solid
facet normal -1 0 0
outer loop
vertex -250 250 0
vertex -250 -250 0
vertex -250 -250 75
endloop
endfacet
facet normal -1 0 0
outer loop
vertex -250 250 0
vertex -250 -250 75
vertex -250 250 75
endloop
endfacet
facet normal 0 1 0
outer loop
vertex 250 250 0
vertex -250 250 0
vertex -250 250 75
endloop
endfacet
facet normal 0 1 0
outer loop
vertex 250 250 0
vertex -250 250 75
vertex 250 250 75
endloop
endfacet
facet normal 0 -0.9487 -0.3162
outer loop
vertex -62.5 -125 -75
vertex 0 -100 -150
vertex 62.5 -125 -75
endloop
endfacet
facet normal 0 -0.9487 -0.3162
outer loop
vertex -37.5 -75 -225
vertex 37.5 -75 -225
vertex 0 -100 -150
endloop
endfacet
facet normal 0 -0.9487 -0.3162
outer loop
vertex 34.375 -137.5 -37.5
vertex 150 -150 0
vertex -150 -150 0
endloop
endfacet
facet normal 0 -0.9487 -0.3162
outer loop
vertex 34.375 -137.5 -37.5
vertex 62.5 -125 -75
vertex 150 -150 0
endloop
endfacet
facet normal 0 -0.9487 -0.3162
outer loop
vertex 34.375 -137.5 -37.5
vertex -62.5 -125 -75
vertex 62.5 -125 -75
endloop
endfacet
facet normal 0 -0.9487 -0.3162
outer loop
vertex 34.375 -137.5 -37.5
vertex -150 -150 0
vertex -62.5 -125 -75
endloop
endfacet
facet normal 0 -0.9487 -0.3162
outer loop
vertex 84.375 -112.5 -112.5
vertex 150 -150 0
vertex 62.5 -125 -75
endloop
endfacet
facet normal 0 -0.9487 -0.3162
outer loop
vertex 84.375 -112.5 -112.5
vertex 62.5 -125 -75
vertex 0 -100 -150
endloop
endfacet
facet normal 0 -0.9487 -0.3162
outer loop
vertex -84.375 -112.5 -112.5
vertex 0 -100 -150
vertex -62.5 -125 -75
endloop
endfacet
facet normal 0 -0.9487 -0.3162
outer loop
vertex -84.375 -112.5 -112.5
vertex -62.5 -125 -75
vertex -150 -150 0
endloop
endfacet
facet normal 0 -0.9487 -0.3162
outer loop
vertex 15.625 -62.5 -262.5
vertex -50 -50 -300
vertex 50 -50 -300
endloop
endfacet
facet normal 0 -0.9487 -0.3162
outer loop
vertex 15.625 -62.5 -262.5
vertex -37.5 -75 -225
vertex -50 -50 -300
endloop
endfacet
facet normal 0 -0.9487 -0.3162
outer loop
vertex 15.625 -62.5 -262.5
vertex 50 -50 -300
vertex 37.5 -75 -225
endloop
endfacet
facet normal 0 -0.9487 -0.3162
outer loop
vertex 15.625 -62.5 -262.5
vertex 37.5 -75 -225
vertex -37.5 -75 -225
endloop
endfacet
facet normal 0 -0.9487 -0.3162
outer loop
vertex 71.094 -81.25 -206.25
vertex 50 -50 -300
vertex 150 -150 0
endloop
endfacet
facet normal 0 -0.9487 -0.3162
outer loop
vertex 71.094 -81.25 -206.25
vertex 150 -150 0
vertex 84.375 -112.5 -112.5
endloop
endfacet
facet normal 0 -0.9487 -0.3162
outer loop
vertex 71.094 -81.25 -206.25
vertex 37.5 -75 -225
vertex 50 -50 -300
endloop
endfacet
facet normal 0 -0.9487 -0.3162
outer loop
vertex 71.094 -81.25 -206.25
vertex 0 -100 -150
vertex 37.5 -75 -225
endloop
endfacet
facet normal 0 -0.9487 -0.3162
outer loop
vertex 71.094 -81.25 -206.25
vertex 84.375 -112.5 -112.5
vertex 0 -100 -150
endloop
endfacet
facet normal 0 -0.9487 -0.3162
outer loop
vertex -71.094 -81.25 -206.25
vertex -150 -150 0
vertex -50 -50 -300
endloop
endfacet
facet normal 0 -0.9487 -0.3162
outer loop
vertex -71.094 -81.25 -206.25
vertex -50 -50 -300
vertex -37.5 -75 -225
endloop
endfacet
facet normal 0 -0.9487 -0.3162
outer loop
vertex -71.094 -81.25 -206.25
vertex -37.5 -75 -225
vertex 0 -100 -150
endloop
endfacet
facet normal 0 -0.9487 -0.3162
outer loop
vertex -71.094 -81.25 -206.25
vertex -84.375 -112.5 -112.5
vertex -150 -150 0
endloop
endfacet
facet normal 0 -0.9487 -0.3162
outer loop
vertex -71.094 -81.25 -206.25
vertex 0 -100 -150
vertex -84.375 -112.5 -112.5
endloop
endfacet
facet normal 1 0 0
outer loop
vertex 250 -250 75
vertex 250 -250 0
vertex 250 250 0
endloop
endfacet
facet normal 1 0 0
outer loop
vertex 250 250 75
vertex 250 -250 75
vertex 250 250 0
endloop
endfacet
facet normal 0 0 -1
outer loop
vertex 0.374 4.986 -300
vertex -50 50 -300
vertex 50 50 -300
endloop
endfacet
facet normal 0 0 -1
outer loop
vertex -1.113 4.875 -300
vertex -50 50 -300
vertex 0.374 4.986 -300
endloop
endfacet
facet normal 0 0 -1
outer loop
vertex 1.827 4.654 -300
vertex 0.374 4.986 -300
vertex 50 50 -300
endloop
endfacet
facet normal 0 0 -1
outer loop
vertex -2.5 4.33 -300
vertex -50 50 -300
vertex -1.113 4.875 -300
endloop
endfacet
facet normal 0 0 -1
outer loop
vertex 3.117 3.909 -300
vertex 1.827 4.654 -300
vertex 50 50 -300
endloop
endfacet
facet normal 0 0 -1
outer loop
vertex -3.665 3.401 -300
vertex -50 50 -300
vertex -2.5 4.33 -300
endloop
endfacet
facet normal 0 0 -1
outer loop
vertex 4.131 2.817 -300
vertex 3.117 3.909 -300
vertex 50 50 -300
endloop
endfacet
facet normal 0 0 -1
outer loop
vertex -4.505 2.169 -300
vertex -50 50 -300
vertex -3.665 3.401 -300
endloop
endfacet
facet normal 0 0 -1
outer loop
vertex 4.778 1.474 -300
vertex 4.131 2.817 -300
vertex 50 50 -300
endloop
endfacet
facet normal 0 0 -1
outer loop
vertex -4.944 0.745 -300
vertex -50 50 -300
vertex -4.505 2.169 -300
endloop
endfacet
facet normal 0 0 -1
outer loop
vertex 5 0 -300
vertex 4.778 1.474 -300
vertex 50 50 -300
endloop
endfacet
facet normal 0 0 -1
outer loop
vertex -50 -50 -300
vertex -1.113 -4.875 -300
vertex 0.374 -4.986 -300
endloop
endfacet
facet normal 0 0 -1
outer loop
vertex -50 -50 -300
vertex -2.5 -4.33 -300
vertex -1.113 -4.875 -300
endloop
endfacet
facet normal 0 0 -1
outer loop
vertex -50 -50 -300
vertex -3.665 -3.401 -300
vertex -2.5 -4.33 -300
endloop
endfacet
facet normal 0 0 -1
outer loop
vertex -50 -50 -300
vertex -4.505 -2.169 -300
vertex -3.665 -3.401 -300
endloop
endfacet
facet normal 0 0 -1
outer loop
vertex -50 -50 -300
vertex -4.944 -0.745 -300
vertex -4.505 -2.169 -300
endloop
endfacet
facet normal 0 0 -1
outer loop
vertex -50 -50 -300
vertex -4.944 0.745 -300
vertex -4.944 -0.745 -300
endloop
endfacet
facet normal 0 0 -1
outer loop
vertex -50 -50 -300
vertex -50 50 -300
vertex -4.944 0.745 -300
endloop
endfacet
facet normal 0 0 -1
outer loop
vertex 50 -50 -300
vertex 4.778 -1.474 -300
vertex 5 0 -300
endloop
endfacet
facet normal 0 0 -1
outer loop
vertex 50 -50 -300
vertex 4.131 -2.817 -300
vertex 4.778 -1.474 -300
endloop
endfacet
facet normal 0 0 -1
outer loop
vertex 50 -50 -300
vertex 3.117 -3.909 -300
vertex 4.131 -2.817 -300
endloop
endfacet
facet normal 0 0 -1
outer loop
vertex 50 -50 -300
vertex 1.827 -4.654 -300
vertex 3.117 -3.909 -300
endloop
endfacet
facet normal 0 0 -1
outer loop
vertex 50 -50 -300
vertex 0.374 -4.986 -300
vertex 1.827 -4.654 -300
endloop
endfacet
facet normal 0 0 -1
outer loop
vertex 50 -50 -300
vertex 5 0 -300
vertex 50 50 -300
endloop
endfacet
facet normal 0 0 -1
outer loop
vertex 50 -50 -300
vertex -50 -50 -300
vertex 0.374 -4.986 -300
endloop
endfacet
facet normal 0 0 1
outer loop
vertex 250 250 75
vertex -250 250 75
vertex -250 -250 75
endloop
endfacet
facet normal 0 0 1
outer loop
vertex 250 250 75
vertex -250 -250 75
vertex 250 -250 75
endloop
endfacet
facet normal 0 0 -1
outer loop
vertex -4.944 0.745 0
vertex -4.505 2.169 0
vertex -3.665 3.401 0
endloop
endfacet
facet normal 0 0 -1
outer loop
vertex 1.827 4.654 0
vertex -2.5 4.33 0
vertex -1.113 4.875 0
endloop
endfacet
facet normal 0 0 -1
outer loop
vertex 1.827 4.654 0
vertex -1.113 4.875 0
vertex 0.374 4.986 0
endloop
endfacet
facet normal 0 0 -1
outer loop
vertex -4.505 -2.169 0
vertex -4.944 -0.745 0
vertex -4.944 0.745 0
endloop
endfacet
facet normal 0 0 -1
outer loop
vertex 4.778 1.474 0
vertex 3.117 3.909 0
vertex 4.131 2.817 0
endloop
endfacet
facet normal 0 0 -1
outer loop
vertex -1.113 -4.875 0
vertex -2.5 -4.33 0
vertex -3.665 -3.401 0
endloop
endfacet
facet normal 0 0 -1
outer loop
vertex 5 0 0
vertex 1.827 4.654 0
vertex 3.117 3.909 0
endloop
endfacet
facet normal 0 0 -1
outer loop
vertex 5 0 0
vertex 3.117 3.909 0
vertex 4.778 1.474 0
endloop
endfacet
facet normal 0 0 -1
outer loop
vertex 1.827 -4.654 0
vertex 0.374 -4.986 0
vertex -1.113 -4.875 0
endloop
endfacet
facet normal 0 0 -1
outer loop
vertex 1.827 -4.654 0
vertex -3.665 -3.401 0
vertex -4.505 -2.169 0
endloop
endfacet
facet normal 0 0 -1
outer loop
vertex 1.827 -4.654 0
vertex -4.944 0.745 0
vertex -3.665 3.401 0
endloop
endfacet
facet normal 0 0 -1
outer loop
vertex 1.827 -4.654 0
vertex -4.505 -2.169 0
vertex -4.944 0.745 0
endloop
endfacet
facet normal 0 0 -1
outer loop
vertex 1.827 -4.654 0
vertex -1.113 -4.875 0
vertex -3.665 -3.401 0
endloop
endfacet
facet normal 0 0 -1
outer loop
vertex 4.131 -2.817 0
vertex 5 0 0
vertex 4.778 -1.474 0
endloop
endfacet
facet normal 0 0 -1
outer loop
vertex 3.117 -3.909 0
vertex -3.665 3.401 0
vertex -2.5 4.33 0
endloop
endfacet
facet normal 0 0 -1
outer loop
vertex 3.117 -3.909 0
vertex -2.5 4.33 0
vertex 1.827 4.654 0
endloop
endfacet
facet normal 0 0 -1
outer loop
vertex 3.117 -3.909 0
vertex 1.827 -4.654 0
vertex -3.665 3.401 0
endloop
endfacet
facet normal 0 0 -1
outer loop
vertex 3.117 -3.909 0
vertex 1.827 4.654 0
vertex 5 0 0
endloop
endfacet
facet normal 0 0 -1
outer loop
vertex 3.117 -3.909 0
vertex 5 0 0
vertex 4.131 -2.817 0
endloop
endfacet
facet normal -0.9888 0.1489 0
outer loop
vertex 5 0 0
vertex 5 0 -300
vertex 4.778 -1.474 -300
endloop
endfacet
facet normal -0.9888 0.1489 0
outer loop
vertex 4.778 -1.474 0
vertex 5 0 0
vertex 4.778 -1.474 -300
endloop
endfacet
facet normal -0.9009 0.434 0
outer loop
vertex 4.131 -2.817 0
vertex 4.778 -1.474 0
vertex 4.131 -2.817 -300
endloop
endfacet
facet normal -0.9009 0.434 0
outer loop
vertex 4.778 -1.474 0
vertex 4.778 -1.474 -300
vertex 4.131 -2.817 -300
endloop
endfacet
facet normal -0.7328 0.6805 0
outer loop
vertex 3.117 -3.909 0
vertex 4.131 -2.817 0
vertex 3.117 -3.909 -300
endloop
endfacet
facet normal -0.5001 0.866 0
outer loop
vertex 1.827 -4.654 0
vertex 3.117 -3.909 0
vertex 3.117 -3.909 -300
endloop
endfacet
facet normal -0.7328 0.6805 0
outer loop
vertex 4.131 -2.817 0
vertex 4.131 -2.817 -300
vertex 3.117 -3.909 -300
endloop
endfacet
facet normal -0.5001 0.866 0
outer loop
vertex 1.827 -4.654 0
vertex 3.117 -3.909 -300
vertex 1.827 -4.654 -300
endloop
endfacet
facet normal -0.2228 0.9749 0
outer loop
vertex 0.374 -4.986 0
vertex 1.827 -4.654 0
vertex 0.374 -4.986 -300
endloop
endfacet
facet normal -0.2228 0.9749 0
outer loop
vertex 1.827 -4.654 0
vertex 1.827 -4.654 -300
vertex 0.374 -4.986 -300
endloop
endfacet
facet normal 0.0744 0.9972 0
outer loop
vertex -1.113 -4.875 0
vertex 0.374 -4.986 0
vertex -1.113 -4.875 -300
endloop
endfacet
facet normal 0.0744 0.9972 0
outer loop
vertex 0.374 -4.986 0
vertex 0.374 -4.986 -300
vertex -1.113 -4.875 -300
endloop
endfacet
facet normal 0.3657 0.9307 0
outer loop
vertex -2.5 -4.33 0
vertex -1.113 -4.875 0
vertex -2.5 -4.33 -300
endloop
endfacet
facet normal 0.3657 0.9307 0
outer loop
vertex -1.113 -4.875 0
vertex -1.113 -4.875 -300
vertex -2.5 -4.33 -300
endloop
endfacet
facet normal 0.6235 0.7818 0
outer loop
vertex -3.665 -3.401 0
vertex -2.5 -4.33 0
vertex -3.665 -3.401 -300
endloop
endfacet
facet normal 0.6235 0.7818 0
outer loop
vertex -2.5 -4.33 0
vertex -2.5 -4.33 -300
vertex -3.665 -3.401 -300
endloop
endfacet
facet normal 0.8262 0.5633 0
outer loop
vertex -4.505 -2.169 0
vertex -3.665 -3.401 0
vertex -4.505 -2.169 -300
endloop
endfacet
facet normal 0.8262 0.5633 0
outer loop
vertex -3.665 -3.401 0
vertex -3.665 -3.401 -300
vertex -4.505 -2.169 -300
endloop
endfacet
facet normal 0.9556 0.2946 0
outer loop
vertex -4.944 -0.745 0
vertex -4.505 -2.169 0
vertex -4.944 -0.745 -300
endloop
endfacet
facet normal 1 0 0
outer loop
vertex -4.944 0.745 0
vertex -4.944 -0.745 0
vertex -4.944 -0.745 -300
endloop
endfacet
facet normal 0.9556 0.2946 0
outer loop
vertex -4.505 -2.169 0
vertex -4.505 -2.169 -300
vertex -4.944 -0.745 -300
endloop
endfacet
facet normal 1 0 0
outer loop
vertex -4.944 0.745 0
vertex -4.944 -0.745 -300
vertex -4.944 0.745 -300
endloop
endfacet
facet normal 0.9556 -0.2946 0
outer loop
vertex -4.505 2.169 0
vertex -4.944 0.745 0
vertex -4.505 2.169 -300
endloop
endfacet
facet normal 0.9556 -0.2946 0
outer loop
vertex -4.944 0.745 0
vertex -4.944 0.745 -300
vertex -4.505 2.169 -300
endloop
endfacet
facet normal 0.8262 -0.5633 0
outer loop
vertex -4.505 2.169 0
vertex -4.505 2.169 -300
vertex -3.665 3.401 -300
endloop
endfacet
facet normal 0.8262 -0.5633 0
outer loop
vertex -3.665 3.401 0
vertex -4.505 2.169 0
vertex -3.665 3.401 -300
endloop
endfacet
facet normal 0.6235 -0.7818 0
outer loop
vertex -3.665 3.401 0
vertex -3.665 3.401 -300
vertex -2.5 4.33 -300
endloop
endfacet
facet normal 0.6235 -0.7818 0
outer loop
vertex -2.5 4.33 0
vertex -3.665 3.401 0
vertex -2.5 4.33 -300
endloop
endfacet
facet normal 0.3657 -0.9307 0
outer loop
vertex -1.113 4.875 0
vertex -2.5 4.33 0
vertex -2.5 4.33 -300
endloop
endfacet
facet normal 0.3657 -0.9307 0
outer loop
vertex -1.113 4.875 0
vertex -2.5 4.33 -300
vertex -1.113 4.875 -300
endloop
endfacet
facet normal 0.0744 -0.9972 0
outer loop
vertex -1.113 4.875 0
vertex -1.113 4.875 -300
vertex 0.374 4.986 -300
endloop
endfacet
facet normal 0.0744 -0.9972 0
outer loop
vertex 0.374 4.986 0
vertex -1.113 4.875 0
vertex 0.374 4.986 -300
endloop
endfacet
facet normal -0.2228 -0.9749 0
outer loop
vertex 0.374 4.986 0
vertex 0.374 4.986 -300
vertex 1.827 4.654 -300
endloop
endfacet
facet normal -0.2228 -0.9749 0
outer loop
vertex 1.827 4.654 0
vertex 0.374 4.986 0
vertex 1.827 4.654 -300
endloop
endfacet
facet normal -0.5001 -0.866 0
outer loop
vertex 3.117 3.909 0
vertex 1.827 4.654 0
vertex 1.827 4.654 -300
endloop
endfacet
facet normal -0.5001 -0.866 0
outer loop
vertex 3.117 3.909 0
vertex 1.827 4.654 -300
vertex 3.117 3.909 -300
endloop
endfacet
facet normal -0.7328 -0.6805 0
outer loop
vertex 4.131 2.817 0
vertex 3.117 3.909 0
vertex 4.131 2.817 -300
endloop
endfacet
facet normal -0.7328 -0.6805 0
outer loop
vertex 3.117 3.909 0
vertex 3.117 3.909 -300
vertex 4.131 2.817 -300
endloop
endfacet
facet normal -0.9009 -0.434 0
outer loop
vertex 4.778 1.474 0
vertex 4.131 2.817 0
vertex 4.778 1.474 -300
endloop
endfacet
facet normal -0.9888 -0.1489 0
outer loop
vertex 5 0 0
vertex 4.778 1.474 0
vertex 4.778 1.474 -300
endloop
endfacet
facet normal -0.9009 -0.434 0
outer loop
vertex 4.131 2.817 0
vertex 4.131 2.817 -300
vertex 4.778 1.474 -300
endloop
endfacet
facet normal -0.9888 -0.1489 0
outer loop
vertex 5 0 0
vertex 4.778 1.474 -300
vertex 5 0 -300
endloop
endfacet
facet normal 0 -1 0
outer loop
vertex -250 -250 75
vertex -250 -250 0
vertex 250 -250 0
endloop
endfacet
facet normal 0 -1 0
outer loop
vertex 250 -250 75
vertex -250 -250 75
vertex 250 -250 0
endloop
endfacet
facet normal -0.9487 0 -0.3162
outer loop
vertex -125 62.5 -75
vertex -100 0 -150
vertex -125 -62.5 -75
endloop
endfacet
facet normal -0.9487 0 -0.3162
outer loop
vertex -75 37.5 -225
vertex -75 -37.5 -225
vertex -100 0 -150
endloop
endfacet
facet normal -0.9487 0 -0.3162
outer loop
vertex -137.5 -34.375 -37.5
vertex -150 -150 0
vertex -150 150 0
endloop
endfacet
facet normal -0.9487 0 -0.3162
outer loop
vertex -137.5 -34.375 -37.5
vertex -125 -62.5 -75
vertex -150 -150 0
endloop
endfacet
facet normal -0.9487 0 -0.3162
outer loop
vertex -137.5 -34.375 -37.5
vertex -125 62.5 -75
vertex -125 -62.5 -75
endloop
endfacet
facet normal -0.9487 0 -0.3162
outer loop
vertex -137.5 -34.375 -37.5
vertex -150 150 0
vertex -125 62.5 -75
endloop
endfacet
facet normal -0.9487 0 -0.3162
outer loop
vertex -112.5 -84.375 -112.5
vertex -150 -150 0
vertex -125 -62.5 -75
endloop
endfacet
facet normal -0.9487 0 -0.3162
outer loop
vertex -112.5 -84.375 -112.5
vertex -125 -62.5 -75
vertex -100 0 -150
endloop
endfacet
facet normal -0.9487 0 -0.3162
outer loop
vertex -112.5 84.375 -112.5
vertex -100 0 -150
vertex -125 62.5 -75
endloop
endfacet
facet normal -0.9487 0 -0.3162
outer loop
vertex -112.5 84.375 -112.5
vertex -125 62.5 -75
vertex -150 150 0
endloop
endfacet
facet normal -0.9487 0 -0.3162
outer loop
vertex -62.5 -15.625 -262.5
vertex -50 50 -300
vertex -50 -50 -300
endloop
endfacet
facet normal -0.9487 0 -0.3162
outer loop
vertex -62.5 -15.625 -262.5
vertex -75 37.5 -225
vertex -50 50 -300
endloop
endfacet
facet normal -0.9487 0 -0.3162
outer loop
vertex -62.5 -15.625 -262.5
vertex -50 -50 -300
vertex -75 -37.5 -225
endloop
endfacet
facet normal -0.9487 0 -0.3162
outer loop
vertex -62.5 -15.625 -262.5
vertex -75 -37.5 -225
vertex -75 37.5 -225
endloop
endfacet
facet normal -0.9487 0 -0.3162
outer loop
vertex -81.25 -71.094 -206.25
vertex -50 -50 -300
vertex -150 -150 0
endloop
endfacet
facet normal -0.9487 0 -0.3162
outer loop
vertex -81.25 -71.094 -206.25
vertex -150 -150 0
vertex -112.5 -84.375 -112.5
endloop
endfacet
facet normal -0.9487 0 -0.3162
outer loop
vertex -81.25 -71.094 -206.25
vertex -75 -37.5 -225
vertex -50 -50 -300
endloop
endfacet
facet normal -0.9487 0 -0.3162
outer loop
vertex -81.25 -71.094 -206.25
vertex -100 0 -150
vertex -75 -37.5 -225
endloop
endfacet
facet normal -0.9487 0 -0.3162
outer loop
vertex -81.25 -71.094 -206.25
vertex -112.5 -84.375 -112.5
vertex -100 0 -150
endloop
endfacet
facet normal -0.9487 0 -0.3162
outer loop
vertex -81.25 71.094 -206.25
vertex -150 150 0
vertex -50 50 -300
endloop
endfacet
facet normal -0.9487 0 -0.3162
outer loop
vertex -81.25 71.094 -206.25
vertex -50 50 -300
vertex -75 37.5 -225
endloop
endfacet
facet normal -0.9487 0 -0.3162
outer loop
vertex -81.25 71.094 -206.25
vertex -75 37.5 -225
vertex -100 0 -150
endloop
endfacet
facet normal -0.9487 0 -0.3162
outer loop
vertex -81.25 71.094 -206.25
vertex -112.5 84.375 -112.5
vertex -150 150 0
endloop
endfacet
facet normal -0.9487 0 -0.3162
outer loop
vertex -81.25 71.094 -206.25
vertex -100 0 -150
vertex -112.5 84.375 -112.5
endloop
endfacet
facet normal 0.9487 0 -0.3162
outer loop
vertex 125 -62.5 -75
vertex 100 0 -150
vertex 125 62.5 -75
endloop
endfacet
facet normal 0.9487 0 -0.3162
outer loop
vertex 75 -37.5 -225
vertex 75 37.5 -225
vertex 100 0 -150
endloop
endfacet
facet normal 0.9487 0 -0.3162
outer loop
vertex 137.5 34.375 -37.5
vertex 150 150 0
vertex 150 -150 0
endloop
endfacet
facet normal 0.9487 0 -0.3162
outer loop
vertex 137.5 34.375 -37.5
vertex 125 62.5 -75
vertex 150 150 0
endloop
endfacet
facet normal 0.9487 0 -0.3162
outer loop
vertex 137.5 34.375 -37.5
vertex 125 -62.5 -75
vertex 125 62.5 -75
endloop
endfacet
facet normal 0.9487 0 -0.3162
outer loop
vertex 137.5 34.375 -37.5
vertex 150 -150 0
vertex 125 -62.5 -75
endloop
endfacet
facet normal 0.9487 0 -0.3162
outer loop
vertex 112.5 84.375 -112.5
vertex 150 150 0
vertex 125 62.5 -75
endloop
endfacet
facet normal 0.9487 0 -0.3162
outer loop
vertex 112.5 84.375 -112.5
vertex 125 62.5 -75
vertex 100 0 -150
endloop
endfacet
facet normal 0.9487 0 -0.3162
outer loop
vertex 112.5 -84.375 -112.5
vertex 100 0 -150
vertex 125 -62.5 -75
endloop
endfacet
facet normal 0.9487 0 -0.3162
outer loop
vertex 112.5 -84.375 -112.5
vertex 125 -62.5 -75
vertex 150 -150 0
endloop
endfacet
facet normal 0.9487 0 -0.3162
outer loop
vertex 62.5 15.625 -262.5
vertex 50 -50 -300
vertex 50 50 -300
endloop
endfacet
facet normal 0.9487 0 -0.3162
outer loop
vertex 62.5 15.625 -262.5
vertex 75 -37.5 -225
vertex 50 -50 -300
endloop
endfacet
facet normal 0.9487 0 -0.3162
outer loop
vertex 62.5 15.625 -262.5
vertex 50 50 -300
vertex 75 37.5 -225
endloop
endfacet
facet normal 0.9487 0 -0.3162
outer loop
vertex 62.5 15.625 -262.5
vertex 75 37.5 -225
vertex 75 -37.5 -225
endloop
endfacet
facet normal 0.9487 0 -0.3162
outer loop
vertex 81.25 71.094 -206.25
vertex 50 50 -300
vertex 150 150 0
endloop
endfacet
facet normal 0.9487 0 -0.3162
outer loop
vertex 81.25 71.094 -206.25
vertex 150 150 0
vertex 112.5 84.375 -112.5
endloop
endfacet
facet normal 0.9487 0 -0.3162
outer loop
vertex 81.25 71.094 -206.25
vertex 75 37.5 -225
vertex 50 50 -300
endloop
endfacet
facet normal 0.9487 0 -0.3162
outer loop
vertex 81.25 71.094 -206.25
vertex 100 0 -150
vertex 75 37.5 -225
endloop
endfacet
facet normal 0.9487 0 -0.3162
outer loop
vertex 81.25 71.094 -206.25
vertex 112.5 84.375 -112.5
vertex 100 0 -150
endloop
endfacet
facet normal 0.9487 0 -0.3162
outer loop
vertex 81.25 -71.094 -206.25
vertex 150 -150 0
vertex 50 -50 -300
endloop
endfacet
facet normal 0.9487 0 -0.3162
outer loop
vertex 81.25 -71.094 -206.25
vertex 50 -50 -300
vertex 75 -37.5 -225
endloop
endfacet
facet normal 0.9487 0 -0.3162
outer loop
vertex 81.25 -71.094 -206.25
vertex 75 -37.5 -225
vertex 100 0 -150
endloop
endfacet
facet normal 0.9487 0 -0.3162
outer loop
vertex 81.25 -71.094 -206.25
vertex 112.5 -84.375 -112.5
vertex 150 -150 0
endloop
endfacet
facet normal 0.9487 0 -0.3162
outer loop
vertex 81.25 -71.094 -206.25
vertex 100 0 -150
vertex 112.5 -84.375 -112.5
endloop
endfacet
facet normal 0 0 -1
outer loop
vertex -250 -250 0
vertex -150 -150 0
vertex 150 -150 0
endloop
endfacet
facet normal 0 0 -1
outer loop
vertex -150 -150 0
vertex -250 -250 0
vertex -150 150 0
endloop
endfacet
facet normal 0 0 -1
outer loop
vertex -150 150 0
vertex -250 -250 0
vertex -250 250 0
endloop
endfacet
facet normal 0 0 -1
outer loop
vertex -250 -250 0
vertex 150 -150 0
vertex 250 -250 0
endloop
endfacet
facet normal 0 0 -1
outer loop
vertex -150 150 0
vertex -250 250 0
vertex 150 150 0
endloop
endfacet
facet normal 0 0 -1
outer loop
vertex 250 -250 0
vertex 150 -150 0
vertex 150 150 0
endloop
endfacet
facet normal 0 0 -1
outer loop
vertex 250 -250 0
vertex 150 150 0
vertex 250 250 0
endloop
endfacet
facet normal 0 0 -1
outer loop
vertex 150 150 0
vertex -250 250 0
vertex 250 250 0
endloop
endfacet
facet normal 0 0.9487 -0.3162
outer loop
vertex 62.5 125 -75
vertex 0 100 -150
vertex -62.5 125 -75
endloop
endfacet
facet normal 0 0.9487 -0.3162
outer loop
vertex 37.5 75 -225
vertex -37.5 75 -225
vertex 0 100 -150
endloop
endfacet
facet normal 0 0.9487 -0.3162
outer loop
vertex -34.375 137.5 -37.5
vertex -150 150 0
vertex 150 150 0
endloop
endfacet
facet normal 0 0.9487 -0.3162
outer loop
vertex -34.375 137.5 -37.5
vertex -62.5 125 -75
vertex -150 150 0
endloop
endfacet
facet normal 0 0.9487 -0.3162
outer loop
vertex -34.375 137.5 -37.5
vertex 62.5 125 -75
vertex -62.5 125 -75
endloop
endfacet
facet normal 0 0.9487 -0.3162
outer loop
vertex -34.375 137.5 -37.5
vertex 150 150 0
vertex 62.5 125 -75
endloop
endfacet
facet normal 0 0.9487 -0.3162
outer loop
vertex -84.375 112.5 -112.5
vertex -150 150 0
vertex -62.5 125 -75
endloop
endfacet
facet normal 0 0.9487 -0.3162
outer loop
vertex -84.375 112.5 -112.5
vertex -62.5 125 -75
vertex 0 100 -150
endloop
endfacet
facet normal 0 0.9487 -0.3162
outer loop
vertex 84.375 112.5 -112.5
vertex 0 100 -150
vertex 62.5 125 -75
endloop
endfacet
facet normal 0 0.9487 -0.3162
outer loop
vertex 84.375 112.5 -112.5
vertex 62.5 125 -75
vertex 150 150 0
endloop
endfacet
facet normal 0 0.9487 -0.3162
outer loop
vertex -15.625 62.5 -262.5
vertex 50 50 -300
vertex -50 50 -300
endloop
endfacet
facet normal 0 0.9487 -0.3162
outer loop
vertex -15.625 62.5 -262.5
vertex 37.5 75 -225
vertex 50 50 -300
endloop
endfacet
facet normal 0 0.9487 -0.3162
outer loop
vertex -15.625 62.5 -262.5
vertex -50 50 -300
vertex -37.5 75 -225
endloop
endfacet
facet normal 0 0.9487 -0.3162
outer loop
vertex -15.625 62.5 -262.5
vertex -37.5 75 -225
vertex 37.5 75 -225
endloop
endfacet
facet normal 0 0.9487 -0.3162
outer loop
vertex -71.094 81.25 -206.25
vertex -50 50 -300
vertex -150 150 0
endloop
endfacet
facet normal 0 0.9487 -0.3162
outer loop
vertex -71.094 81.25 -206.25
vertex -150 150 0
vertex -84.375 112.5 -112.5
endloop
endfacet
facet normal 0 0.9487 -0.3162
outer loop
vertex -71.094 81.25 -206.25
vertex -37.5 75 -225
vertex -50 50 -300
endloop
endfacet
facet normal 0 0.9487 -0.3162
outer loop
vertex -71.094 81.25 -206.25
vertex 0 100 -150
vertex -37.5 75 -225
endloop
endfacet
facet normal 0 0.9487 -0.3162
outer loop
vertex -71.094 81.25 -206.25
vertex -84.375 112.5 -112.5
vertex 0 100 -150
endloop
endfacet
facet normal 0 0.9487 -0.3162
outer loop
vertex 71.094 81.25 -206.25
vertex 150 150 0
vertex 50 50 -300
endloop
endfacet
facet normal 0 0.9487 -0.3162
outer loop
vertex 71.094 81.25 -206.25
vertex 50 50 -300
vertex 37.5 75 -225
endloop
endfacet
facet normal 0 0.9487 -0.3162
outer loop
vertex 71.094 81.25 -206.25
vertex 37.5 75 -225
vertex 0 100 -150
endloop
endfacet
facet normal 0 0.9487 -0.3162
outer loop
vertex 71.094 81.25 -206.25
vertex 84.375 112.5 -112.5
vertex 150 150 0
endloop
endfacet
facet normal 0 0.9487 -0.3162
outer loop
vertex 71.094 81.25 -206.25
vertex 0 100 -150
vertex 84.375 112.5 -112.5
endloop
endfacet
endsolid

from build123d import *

# Parameters (mm, degrees)
F0_W     = 500
F0_H     = 500
F1_DEPTH = 75
F2_W     = 300
F2_H     = 300
F4_W     = 100
F4_H     = 100
F6_R     = 5
F7_DEPTH = 300


with BuildPart() as f1:
    # F0 (on Top) → F1 (new body)
    with BuildSketch(Plane.XY):
        Rectangle(F0_W, F0_H)
    extrude(amount=F1_DEPTH)

    # F2 (on face) → F5 section 0
    with BuildSketch(Plane(origin=(0, 0, 0), x_dir=(1, 0, 0), z_dir=(0, 0, -1))):
        Rectangle(F2_W, F2_H)
    # F4 (on offset) → F5 section 1
    with BuildSketch(Plane(origin=(0, 0, -300), x_dir=(1, 0, 0), z_dir=(0, 0, -1))):
        Rectangle(F4_W, F4_H)
    loft()

    # F6 (on face) → F7 (cut)
    with BuildSketch(Plane(origin=(0, 0, -300), x_dir=(1, 0, 0), z_dir=(0, 0, -1))):
        Circle(F6_R)
    extrude(amount=-F7_DEPTH, mode=Mode.SUBTRACT)


solid = f1.part
